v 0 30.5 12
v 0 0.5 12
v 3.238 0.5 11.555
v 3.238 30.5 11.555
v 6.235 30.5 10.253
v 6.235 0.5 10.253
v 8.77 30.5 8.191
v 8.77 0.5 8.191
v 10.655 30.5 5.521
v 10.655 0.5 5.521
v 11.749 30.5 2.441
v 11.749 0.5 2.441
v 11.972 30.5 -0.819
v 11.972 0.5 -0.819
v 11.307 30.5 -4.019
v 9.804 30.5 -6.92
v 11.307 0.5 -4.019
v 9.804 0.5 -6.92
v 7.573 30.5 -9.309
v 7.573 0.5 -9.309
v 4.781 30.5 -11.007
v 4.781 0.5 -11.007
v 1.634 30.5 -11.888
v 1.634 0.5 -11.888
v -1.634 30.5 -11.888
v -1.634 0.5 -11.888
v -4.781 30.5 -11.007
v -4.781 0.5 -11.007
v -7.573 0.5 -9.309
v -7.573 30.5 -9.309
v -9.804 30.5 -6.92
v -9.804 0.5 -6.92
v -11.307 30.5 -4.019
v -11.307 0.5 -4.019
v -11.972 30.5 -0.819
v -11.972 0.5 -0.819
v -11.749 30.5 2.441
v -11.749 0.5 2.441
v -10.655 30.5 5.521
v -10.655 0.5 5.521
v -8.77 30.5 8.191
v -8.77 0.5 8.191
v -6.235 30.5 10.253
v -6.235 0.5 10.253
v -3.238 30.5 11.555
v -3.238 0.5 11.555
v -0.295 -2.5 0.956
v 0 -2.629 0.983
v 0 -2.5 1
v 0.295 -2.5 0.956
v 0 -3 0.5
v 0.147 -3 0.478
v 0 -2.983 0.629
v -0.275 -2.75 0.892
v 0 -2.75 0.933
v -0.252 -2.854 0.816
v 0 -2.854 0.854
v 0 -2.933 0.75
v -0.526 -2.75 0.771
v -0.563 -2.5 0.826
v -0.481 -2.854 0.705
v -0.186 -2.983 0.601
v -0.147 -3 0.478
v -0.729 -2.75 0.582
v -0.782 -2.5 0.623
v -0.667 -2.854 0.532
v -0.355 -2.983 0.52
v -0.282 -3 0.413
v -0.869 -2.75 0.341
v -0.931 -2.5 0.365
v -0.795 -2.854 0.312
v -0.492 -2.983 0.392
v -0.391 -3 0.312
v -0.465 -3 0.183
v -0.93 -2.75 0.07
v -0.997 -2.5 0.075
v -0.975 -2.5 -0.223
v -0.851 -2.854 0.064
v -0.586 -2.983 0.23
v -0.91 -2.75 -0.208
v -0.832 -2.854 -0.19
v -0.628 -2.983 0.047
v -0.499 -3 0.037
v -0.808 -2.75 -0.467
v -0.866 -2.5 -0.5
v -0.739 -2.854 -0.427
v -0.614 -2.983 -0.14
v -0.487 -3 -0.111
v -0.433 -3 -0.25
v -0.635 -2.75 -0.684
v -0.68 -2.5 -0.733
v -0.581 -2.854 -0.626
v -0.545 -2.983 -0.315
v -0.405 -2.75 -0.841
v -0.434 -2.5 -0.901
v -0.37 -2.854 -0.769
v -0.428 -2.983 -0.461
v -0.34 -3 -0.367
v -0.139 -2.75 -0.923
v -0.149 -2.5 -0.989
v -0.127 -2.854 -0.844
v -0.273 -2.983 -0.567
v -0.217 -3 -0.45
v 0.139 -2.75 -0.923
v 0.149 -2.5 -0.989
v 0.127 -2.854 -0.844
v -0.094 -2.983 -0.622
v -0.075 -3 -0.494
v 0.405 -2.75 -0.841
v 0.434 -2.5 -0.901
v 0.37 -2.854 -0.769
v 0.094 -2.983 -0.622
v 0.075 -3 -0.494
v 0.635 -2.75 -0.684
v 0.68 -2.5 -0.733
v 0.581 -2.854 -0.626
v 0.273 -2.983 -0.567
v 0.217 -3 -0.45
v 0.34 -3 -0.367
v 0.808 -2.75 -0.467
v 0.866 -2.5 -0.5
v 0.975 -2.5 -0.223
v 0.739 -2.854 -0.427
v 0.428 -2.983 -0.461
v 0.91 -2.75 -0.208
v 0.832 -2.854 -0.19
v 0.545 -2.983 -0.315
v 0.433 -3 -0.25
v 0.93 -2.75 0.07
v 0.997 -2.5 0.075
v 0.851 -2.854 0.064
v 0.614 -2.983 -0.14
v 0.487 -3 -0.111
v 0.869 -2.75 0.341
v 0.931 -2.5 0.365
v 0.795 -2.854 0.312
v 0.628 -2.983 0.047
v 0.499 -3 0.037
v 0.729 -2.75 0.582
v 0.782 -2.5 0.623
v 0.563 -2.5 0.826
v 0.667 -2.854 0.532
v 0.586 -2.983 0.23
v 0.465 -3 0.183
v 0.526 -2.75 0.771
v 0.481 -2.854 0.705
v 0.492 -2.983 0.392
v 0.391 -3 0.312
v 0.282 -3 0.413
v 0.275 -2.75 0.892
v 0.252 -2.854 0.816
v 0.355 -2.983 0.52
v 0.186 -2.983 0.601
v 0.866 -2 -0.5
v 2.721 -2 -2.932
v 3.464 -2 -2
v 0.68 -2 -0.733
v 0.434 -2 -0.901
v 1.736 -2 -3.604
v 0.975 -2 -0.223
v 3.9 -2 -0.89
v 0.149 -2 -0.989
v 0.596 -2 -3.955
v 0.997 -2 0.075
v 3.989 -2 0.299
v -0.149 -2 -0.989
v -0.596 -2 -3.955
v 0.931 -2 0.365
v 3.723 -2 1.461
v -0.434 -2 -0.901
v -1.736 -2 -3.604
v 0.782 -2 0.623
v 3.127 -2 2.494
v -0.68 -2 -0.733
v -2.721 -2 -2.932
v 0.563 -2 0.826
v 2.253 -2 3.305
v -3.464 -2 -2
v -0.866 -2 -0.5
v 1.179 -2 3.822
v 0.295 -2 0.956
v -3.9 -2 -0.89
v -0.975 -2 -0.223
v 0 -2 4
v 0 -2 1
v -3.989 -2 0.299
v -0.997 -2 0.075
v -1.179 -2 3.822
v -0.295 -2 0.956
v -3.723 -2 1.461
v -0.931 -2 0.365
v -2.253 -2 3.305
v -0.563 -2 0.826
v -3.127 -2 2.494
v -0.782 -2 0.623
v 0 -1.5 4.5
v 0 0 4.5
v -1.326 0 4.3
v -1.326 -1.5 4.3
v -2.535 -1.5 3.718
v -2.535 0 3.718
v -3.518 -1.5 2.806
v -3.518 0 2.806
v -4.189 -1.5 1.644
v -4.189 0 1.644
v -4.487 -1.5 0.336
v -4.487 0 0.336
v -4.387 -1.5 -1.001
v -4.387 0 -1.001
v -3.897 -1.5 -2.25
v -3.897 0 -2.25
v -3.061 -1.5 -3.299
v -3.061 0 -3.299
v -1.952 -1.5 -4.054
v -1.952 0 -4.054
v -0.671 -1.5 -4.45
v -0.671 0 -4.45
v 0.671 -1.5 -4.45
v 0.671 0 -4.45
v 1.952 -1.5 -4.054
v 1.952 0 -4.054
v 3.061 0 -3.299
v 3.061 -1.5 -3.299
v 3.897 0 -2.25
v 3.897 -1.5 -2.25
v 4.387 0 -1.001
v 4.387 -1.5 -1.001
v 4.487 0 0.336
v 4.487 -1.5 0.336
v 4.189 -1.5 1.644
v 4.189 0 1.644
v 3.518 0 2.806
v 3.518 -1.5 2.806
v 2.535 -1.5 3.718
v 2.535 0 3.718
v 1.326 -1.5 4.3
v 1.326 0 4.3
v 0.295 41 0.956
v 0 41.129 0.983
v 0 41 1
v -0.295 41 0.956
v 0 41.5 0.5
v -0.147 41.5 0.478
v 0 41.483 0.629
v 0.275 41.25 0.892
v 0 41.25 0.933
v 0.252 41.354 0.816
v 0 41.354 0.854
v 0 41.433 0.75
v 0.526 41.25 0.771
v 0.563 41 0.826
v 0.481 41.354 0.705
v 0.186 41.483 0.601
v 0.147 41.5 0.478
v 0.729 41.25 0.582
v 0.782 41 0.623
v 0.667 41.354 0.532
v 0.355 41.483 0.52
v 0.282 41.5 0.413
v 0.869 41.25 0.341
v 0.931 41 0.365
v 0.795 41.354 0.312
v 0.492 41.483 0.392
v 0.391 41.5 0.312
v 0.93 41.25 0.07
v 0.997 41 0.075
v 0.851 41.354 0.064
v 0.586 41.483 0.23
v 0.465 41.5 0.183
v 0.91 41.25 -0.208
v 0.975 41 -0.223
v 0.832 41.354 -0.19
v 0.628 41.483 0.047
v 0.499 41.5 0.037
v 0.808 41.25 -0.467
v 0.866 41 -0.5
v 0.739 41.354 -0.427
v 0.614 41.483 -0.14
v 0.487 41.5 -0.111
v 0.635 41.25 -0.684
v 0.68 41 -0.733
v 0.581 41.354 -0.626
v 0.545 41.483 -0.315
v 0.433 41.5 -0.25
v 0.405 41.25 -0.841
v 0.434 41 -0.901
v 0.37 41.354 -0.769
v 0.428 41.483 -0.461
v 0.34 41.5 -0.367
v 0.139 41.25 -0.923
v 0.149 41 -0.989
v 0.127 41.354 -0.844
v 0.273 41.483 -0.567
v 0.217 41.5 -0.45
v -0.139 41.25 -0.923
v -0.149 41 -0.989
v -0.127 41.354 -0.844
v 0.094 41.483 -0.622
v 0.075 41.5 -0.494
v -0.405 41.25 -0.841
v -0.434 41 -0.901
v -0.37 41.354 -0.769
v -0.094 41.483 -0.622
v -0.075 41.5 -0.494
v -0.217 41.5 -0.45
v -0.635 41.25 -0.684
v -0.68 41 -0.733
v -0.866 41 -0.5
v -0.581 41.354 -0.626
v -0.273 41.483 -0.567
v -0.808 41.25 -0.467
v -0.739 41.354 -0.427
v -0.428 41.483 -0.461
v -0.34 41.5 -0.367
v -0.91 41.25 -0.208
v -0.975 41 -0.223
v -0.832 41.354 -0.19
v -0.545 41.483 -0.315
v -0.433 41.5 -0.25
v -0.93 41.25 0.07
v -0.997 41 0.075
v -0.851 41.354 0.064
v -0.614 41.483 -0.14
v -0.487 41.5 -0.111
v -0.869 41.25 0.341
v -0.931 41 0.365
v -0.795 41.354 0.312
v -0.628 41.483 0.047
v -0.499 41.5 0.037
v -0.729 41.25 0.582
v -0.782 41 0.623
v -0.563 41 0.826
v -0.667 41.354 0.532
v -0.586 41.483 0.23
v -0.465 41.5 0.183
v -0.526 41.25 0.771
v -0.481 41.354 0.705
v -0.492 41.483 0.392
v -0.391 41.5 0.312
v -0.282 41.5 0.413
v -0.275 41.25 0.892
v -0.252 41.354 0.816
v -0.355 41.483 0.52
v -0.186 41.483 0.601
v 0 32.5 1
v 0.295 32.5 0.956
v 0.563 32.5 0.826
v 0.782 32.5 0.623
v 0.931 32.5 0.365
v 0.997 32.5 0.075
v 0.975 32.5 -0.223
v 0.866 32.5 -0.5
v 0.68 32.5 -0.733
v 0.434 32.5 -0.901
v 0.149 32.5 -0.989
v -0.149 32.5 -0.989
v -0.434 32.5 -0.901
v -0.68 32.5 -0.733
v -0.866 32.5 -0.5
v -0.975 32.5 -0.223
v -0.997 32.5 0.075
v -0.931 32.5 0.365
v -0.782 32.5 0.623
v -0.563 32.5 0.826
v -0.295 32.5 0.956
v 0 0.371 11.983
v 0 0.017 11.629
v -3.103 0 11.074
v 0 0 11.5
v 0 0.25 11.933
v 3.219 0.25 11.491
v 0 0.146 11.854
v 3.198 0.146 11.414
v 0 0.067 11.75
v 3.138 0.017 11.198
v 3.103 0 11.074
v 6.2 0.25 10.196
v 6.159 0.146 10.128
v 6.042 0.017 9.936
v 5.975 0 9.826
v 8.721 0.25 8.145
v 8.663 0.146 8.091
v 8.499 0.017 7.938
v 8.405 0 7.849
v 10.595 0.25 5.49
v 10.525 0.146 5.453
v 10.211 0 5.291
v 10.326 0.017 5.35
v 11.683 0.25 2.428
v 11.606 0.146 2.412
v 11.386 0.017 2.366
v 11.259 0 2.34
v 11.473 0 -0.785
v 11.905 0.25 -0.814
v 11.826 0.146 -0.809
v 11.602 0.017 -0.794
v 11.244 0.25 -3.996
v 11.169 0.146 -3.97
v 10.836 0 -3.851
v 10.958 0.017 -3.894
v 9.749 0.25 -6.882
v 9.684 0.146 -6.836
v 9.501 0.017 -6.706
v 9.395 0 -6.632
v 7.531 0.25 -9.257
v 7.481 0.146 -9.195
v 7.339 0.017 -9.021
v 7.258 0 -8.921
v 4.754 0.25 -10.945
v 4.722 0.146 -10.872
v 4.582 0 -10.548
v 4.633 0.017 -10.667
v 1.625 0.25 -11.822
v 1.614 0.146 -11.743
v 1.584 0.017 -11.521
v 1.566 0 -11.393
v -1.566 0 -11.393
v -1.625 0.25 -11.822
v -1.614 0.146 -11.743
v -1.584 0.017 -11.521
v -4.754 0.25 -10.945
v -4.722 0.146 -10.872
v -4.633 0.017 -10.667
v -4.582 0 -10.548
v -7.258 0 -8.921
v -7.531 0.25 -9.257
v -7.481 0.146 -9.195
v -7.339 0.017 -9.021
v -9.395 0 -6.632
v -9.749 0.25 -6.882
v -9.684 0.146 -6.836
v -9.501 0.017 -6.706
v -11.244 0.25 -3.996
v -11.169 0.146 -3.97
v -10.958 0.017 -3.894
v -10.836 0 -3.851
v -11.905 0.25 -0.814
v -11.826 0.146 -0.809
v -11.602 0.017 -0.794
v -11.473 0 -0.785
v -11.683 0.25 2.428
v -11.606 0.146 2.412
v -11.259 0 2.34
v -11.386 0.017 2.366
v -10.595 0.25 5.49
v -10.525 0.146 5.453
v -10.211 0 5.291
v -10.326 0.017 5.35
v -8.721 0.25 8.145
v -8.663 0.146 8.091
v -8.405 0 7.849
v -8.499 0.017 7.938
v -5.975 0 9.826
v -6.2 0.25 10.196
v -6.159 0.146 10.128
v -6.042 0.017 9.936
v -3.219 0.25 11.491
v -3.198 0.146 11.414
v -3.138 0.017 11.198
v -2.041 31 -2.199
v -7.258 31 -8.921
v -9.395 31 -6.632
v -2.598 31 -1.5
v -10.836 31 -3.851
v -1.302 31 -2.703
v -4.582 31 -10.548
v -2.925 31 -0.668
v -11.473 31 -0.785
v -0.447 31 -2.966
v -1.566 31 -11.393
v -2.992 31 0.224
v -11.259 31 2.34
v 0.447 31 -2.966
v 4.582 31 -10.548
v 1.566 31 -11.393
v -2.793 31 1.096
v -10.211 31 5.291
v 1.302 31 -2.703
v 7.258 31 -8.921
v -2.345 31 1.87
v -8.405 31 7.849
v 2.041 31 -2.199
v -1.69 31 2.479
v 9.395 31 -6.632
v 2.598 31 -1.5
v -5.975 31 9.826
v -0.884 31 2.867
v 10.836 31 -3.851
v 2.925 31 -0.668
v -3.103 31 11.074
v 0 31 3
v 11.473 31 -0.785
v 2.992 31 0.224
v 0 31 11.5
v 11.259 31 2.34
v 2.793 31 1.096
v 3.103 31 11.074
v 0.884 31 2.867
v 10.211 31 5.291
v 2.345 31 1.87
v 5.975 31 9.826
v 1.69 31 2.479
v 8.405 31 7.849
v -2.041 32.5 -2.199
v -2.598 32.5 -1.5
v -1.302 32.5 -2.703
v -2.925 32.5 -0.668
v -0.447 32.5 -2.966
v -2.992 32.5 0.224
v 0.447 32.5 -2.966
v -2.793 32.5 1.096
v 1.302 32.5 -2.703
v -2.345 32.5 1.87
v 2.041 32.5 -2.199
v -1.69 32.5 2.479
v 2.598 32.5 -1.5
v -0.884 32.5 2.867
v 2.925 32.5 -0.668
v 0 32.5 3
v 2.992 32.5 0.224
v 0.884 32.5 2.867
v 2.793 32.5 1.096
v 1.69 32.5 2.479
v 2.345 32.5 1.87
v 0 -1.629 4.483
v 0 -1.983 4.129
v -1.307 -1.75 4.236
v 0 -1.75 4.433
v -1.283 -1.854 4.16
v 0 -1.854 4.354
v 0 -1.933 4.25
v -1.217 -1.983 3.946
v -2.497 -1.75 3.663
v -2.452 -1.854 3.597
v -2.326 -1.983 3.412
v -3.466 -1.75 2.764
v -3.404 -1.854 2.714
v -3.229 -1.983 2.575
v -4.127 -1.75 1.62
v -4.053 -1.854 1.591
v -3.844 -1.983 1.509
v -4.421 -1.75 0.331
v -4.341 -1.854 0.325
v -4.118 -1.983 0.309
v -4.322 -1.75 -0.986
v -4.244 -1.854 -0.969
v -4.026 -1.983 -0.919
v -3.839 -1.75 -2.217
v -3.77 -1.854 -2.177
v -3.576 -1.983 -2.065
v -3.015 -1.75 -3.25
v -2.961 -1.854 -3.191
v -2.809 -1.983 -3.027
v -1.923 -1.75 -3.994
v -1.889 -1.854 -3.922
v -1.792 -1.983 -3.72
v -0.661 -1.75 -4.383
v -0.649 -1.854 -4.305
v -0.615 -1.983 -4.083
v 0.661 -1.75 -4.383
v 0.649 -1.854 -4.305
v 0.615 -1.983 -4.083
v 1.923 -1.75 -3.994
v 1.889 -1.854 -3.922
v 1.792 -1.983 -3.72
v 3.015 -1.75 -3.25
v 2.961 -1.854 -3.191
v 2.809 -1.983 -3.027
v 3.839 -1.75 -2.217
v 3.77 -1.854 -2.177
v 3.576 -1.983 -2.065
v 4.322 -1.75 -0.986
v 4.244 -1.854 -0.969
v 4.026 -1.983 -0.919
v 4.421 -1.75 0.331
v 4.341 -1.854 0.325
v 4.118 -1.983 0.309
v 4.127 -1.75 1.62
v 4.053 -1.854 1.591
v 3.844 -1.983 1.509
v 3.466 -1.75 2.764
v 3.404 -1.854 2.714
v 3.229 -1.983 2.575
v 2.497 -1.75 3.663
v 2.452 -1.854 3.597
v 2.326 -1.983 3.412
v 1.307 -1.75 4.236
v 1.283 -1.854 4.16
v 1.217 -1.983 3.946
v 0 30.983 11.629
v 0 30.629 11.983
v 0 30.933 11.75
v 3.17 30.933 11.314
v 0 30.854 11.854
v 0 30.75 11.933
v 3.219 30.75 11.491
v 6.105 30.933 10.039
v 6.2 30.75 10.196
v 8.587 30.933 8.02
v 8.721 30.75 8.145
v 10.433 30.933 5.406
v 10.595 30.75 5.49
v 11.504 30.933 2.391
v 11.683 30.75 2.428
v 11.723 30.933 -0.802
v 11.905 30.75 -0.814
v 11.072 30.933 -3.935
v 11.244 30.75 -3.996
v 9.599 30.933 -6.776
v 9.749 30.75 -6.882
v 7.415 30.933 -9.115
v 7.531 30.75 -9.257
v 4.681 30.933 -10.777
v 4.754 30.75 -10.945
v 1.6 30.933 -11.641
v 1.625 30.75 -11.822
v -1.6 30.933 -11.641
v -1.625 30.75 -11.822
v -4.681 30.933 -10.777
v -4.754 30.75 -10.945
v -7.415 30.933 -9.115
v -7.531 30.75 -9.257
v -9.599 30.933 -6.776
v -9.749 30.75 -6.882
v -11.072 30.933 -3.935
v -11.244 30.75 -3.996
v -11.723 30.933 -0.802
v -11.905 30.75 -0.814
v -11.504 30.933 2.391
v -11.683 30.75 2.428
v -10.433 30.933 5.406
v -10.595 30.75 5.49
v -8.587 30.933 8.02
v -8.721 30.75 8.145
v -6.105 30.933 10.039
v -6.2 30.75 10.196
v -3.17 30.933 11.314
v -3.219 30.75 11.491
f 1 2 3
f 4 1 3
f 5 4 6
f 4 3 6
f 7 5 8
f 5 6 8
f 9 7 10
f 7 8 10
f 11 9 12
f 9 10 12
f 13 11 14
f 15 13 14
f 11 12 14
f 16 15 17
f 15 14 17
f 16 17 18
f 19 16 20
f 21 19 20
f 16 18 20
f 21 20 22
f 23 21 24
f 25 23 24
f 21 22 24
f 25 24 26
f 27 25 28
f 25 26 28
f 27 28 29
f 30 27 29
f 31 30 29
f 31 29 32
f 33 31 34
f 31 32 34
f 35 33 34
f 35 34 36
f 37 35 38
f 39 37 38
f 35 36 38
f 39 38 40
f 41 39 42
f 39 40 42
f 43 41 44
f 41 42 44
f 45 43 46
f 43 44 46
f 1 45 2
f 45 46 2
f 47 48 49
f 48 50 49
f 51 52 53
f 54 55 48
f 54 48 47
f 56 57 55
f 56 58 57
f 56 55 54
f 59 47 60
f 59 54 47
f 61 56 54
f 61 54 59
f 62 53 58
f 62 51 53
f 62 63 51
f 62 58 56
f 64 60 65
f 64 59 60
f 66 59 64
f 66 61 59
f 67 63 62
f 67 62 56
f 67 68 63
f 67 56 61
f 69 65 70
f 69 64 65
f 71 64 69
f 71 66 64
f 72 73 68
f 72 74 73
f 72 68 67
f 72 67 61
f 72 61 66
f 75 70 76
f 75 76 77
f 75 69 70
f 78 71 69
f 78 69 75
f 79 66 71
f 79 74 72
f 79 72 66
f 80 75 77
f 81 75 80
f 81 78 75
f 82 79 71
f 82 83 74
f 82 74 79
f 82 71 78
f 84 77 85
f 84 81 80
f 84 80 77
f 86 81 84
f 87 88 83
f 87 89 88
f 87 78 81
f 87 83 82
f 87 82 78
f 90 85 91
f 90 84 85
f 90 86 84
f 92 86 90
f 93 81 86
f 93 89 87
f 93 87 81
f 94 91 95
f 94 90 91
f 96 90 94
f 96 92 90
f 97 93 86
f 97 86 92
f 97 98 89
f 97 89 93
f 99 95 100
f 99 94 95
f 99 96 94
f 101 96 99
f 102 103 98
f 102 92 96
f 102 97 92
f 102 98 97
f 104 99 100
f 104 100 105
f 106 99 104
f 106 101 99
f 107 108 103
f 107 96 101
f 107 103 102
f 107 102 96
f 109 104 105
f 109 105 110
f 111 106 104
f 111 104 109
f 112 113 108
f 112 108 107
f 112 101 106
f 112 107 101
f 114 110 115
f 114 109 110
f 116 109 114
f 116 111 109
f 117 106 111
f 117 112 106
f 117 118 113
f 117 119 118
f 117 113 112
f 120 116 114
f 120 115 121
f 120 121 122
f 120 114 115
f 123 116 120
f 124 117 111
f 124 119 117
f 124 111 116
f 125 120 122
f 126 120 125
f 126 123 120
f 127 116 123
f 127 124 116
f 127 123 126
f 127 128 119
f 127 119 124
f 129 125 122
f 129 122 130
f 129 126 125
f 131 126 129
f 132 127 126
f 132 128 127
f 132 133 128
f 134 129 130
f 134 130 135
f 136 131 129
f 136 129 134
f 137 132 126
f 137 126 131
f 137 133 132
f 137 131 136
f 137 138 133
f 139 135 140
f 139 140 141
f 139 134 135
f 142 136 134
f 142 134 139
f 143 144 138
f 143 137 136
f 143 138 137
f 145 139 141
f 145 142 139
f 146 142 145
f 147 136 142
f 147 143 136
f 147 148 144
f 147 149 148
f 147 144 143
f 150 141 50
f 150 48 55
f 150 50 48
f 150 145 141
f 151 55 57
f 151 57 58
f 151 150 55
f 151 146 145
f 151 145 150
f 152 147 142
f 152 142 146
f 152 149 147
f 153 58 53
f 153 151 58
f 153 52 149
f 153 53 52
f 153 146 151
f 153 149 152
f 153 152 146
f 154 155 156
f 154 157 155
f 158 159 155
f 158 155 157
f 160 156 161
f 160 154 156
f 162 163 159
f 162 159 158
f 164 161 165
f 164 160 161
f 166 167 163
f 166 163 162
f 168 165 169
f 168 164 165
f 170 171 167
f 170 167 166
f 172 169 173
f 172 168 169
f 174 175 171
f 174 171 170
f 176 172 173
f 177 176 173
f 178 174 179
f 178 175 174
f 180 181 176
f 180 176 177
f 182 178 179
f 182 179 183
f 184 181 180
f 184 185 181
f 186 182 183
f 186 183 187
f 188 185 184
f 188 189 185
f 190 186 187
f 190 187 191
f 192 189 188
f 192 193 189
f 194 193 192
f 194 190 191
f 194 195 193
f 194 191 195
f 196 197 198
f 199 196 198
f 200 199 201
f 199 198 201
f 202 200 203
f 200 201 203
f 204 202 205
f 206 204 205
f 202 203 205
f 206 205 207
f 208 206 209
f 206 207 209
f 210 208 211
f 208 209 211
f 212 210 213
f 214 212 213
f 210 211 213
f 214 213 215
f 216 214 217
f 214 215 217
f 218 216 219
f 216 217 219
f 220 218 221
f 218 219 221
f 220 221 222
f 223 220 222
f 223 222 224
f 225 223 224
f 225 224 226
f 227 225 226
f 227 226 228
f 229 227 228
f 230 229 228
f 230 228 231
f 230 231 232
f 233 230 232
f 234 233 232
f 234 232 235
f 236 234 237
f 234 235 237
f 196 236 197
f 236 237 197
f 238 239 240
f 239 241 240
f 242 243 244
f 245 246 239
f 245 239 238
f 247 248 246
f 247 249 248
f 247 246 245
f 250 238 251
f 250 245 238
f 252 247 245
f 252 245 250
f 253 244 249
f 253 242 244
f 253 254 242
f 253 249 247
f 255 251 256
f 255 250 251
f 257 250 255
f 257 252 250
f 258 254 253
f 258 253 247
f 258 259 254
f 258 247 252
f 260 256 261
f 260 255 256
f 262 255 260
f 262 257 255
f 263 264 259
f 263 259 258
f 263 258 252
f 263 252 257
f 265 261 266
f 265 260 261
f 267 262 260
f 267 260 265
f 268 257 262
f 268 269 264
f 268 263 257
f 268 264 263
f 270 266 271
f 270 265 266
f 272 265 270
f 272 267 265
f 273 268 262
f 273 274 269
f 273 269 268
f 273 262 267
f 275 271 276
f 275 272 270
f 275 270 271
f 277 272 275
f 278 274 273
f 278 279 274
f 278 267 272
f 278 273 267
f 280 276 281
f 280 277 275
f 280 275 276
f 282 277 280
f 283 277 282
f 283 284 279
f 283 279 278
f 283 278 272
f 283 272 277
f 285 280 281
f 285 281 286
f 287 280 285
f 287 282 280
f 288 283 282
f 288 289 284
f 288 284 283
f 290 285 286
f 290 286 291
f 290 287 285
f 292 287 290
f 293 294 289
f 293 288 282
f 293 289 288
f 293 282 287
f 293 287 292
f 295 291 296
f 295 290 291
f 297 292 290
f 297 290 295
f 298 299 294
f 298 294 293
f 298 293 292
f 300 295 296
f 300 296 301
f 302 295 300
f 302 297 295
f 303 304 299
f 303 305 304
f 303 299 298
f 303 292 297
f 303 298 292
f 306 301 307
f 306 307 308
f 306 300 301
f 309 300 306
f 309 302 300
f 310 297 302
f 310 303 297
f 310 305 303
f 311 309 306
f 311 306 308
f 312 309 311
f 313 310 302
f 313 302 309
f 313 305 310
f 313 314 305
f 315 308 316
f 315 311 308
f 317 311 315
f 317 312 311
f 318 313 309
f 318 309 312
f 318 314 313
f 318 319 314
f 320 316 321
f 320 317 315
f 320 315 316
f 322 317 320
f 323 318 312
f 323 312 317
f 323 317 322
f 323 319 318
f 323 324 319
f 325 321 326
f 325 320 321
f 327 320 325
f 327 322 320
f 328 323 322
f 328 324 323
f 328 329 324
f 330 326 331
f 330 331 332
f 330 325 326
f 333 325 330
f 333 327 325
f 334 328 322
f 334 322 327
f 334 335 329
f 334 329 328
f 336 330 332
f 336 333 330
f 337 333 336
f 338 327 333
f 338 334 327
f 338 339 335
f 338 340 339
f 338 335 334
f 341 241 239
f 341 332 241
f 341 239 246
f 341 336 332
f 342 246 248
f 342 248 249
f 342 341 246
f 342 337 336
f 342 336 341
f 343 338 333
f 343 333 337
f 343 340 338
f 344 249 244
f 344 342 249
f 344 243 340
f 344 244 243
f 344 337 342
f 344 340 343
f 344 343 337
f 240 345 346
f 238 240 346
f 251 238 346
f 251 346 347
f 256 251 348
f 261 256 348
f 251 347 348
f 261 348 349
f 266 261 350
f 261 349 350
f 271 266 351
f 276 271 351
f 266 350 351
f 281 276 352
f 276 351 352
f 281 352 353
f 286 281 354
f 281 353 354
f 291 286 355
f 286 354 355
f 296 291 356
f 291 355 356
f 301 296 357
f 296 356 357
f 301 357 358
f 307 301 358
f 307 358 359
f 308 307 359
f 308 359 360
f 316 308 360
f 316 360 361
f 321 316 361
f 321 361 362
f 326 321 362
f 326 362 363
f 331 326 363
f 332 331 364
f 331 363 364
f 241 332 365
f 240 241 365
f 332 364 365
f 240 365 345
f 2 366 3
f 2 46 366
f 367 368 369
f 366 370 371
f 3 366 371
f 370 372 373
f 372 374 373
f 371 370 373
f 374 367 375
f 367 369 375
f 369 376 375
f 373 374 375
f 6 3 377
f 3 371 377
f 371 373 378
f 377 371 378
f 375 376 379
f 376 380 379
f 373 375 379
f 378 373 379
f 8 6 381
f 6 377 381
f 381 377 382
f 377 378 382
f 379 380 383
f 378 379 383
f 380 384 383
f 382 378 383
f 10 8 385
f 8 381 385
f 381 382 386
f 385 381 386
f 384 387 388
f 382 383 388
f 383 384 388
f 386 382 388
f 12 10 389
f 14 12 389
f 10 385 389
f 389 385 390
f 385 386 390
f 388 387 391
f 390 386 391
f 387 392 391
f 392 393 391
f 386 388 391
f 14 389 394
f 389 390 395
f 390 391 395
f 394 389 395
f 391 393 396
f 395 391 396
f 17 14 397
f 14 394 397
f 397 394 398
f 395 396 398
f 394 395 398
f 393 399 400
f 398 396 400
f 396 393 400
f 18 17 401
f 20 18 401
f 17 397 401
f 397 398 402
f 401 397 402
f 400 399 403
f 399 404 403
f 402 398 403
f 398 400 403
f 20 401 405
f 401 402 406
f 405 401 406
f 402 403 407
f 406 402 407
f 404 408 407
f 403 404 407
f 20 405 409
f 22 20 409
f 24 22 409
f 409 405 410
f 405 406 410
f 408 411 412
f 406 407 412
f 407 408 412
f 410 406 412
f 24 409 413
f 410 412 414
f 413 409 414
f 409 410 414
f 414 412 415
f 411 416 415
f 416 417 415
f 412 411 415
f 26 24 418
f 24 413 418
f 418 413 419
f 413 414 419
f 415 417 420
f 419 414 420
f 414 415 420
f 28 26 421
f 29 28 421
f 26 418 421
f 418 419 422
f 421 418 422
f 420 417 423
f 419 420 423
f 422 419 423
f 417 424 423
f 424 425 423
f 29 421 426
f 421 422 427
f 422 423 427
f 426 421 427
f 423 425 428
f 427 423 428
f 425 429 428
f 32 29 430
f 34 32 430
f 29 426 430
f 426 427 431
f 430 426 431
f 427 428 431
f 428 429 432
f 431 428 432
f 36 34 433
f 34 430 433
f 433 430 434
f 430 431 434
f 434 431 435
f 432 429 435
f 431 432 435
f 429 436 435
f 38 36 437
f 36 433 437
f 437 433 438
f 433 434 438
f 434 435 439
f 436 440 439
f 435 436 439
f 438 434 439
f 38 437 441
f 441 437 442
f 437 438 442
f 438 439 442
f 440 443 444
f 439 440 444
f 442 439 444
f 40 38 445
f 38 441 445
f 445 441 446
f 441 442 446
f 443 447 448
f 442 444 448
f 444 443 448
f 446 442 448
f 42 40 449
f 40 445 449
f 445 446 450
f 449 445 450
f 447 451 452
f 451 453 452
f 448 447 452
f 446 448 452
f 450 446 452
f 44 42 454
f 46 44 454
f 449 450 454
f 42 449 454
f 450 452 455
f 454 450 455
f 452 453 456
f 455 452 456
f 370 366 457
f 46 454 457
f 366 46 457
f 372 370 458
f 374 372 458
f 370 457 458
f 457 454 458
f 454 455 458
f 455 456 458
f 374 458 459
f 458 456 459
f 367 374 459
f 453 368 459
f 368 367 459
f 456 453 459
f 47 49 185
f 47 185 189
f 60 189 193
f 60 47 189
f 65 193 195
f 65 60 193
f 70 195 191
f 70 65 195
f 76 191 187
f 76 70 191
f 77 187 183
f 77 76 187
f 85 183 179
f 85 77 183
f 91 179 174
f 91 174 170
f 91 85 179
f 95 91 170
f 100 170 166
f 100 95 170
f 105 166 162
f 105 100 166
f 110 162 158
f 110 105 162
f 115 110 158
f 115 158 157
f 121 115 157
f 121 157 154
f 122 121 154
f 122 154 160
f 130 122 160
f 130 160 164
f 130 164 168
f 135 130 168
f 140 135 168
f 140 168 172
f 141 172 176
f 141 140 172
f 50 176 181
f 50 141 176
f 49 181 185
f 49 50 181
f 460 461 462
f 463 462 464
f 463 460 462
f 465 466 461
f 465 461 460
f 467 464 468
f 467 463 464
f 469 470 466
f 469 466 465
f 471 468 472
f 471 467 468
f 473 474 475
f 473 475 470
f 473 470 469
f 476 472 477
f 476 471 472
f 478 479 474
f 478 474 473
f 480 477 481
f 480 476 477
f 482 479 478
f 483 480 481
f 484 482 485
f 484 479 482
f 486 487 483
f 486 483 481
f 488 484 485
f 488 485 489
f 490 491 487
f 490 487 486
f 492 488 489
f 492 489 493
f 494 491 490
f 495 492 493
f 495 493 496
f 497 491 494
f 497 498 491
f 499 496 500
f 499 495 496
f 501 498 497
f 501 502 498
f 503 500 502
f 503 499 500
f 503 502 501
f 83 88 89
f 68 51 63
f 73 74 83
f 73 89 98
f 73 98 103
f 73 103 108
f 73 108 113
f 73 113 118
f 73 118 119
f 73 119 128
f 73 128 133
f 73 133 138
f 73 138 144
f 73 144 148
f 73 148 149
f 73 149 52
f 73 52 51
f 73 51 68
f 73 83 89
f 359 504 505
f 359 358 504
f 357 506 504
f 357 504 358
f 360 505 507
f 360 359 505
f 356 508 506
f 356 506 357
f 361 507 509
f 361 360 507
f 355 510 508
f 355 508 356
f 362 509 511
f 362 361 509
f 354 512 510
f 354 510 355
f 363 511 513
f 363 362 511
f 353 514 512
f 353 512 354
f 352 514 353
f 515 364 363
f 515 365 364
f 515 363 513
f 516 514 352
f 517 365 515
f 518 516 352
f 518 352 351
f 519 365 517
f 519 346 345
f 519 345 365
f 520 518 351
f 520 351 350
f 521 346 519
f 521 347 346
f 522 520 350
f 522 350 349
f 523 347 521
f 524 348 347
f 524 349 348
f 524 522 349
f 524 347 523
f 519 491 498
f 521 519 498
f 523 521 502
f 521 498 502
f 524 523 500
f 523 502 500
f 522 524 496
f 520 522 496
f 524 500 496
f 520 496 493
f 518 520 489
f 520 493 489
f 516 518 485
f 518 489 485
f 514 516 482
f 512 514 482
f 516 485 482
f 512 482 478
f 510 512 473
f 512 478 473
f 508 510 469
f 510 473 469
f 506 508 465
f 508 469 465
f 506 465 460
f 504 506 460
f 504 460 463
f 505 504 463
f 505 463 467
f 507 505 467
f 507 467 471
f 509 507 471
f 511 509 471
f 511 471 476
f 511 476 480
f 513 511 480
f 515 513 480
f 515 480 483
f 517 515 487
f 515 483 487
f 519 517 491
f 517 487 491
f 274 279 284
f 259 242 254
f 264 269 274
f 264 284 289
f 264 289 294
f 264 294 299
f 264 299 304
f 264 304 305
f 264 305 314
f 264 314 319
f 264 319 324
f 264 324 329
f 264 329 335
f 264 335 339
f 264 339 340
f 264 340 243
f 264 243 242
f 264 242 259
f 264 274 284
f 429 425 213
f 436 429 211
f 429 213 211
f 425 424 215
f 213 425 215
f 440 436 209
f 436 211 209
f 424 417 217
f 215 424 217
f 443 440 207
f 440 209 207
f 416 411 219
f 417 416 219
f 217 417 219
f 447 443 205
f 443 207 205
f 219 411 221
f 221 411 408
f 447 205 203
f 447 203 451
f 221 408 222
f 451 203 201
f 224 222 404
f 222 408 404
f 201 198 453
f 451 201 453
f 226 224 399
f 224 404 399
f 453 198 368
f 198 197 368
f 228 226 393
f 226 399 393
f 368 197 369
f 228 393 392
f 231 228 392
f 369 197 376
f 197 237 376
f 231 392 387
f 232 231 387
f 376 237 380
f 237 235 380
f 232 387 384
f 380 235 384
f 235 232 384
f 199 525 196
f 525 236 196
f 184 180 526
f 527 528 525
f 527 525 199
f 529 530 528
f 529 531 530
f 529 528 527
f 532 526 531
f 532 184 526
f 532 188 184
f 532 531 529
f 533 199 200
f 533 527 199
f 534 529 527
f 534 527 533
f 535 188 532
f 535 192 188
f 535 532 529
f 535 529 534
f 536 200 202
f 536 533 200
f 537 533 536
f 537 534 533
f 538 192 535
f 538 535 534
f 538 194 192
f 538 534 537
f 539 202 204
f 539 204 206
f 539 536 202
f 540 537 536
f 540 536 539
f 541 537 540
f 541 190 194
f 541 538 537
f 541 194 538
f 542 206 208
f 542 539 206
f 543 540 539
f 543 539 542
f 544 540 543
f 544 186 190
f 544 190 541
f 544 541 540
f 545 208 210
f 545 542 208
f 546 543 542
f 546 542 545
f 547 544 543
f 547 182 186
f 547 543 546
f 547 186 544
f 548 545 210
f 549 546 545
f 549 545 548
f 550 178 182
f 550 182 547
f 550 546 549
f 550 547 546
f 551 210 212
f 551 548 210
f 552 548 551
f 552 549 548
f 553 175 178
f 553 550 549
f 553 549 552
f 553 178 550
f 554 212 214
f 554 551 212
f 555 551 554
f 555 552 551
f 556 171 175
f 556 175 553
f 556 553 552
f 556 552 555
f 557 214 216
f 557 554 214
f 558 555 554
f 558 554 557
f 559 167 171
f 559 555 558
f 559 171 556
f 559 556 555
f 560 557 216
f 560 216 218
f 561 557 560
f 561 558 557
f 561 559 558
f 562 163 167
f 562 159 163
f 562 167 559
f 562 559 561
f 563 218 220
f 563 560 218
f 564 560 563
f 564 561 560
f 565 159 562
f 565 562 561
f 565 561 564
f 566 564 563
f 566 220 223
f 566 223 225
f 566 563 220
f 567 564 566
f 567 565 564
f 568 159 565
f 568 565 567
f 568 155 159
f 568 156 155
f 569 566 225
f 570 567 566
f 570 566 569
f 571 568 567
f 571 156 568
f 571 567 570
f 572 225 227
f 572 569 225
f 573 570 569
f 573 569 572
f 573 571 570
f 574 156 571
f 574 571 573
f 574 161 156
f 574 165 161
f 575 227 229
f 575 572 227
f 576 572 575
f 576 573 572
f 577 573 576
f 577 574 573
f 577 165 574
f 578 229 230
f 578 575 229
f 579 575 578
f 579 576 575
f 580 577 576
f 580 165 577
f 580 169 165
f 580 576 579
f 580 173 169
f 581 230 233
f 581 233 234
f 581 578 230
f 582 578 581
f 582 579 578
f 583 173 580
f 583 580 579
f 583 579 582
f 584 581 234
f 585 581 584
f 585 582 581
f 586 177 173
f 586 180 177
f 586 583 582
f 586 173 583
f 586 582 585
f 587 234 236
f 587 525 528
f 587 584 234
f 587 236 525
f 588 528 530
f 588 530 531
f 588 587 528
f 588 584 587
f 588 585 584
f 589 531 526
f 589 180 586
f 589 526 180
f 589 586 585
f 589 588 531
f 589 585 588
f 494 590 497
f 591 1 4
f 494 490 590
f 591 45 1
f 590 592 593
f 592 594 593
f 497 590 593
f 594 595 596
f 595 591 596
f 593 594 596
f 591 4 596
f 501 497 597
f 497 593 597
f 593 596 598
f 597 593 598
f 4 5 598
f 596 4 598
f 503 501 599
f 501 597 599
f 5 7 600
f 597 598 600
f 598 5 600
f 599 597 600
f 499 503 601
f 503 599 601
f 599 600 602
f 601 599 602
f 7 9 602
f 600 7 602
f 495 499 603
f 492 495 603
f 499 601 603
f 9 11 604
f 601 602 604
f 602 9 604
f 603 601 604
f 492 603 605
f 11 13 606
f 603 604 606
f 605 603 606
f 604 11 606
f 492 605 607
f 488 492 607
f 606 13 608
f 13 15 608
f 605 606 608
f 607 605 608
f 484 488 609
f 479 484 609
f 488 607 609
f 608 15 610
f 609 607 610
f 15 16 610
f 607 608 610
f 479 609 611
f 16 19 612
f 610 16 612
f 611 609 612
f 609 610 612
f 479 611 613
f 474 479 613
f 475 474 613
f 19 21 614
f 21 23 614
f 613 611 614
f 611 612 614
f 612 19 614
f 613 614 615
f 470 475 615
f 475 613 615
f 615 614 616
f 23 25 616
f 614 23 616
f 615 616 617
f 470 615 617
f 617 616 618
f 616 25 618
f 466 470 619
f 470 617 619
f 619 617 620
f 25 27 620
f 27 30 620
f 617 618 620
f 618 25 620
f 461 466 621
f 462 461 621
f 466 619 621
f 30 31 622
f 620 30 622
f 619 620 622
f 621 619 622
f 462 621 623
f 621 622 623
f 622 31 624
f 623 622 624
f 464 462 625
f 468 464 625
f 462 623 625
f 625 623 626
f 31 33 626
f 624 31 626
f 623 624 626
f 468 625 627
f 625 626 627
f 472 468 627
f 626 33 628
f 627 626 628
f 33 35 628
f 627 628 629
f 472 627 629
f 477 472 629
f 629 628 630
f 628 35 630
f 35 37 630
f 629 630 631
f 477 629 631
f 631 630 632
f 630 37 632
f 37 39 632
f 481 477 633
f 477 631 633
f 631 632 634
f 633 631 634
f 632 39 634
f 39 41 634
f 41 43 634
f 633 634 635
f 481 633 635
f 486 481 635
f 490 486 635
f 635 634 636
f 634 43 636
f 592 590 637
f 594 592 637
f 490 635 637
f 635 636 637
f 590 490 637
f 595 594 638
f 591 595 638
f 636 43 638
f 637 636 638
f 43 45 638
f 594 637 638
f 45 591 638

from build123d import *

# Parameters (mm, degrees)
SKETCH1_R                = 12
MOTOR_HOUSING_DEPTH      = 31
SKETCH2_R                = 3
MOTOR_FRONT_NIPPLE_DEPTH = 1.5
SKETCH4_R                = 1
FRONT_AXLE_DEPTH         = 9
FILLET1_R                = 0.5
FILLET2_R                = 0.5
SKETCH5_R                = 4.5
BOSS_EXTRUDE1_DEPTH      = 2
BOSS_EXTRUDE2_START      = 1
SKETCH6_R                = 1
BOSS_EXTRUDE2_DEPTH      = 1
FILLET3_R                = 0.5


with BuildPart() as part:
    # Sketch1 → Motor housing (new body)
    with BuildSketch(Plane(origin=(0, 0, 0), x_dir=(1, 0, 0), z_dir=(0, 1, 0))):
        with Locations(Location((0, 0, 0), (0, 0, 270))):
            Circle(SKETCH1_R)
    extrude(amount=MOTOR_HOUSING_DEPTH)

    # Sketch2 → Motor front nipple (add)
    with BuildSketch(Plane(origin=(0, 31, 0), x_dir=(1, 0, 0), z_dir=(0, 1, 0))):
        with Locations(Location((0, 0, 0), (0, 0, 270))):
            Circle(SKETCH2_R)
    extrude(amount=MOTOR_FRONT_NIPPLE_DEPTH)

    # Sketch4 → Front axle (add)
    with BuildSketch(Plane(origin=(0, 32.5, 0), x_dir=(1, 0, 0), z_dir=(0, 1, 0))):
        with Locations(Location((0, 0, 0), (0, 0, 270))):
            Circle(SKETCH4_R)
    extrude(amount=FRONT_AXLE_DEPTH)

    # Fillet1
    fillet1_edges = [part.edges().sort_by_distance(p)[0] for p in [
        (0, 41.5, -1),
    ]]
    fillet(fillet1_edges, radius=FILLET1_R)

    # Fillet2
    fillet2_edges = [part.edges().sort_by_distance(p)[0] for p in [
        (0, 0, -12),
        (0, 31, -12),
    ]]
    fillet(fillet2_edges, radius=FILLET2_R)

    # Sketch5 → Boss-Extrude1 (add)
    with BuildSketch(Plane.XZ):
        with Locations(Location((0, 0, 0), (0, 0, 90))):
            Circle(SKETCH5_R)
    extrude(amount=BOSS_EXTRUDE1_DEPTH)

    # Sketch6 → Boss-Extrude2 (add)
    with BuildSketch(Plane.XZ.offset(2).offset(BOSS_EXTRUDE2_START)):
        with Locations(Location((0, 0, 0), (0, 0, 90))):
            Circle(SKETCH6_R)
    extrude(amount=-BOSS_EXTRUDE2_DEPTH)

    # Fillet3
    fillet3_edges = [part.edges().sort_by_distance(p)[0] for p in [
        (0, -2, -4.5),
        (0, -3, -1),
    ]]
    fillet(fillet3_edges, radius=FILLET3_R)


solid = part.part
